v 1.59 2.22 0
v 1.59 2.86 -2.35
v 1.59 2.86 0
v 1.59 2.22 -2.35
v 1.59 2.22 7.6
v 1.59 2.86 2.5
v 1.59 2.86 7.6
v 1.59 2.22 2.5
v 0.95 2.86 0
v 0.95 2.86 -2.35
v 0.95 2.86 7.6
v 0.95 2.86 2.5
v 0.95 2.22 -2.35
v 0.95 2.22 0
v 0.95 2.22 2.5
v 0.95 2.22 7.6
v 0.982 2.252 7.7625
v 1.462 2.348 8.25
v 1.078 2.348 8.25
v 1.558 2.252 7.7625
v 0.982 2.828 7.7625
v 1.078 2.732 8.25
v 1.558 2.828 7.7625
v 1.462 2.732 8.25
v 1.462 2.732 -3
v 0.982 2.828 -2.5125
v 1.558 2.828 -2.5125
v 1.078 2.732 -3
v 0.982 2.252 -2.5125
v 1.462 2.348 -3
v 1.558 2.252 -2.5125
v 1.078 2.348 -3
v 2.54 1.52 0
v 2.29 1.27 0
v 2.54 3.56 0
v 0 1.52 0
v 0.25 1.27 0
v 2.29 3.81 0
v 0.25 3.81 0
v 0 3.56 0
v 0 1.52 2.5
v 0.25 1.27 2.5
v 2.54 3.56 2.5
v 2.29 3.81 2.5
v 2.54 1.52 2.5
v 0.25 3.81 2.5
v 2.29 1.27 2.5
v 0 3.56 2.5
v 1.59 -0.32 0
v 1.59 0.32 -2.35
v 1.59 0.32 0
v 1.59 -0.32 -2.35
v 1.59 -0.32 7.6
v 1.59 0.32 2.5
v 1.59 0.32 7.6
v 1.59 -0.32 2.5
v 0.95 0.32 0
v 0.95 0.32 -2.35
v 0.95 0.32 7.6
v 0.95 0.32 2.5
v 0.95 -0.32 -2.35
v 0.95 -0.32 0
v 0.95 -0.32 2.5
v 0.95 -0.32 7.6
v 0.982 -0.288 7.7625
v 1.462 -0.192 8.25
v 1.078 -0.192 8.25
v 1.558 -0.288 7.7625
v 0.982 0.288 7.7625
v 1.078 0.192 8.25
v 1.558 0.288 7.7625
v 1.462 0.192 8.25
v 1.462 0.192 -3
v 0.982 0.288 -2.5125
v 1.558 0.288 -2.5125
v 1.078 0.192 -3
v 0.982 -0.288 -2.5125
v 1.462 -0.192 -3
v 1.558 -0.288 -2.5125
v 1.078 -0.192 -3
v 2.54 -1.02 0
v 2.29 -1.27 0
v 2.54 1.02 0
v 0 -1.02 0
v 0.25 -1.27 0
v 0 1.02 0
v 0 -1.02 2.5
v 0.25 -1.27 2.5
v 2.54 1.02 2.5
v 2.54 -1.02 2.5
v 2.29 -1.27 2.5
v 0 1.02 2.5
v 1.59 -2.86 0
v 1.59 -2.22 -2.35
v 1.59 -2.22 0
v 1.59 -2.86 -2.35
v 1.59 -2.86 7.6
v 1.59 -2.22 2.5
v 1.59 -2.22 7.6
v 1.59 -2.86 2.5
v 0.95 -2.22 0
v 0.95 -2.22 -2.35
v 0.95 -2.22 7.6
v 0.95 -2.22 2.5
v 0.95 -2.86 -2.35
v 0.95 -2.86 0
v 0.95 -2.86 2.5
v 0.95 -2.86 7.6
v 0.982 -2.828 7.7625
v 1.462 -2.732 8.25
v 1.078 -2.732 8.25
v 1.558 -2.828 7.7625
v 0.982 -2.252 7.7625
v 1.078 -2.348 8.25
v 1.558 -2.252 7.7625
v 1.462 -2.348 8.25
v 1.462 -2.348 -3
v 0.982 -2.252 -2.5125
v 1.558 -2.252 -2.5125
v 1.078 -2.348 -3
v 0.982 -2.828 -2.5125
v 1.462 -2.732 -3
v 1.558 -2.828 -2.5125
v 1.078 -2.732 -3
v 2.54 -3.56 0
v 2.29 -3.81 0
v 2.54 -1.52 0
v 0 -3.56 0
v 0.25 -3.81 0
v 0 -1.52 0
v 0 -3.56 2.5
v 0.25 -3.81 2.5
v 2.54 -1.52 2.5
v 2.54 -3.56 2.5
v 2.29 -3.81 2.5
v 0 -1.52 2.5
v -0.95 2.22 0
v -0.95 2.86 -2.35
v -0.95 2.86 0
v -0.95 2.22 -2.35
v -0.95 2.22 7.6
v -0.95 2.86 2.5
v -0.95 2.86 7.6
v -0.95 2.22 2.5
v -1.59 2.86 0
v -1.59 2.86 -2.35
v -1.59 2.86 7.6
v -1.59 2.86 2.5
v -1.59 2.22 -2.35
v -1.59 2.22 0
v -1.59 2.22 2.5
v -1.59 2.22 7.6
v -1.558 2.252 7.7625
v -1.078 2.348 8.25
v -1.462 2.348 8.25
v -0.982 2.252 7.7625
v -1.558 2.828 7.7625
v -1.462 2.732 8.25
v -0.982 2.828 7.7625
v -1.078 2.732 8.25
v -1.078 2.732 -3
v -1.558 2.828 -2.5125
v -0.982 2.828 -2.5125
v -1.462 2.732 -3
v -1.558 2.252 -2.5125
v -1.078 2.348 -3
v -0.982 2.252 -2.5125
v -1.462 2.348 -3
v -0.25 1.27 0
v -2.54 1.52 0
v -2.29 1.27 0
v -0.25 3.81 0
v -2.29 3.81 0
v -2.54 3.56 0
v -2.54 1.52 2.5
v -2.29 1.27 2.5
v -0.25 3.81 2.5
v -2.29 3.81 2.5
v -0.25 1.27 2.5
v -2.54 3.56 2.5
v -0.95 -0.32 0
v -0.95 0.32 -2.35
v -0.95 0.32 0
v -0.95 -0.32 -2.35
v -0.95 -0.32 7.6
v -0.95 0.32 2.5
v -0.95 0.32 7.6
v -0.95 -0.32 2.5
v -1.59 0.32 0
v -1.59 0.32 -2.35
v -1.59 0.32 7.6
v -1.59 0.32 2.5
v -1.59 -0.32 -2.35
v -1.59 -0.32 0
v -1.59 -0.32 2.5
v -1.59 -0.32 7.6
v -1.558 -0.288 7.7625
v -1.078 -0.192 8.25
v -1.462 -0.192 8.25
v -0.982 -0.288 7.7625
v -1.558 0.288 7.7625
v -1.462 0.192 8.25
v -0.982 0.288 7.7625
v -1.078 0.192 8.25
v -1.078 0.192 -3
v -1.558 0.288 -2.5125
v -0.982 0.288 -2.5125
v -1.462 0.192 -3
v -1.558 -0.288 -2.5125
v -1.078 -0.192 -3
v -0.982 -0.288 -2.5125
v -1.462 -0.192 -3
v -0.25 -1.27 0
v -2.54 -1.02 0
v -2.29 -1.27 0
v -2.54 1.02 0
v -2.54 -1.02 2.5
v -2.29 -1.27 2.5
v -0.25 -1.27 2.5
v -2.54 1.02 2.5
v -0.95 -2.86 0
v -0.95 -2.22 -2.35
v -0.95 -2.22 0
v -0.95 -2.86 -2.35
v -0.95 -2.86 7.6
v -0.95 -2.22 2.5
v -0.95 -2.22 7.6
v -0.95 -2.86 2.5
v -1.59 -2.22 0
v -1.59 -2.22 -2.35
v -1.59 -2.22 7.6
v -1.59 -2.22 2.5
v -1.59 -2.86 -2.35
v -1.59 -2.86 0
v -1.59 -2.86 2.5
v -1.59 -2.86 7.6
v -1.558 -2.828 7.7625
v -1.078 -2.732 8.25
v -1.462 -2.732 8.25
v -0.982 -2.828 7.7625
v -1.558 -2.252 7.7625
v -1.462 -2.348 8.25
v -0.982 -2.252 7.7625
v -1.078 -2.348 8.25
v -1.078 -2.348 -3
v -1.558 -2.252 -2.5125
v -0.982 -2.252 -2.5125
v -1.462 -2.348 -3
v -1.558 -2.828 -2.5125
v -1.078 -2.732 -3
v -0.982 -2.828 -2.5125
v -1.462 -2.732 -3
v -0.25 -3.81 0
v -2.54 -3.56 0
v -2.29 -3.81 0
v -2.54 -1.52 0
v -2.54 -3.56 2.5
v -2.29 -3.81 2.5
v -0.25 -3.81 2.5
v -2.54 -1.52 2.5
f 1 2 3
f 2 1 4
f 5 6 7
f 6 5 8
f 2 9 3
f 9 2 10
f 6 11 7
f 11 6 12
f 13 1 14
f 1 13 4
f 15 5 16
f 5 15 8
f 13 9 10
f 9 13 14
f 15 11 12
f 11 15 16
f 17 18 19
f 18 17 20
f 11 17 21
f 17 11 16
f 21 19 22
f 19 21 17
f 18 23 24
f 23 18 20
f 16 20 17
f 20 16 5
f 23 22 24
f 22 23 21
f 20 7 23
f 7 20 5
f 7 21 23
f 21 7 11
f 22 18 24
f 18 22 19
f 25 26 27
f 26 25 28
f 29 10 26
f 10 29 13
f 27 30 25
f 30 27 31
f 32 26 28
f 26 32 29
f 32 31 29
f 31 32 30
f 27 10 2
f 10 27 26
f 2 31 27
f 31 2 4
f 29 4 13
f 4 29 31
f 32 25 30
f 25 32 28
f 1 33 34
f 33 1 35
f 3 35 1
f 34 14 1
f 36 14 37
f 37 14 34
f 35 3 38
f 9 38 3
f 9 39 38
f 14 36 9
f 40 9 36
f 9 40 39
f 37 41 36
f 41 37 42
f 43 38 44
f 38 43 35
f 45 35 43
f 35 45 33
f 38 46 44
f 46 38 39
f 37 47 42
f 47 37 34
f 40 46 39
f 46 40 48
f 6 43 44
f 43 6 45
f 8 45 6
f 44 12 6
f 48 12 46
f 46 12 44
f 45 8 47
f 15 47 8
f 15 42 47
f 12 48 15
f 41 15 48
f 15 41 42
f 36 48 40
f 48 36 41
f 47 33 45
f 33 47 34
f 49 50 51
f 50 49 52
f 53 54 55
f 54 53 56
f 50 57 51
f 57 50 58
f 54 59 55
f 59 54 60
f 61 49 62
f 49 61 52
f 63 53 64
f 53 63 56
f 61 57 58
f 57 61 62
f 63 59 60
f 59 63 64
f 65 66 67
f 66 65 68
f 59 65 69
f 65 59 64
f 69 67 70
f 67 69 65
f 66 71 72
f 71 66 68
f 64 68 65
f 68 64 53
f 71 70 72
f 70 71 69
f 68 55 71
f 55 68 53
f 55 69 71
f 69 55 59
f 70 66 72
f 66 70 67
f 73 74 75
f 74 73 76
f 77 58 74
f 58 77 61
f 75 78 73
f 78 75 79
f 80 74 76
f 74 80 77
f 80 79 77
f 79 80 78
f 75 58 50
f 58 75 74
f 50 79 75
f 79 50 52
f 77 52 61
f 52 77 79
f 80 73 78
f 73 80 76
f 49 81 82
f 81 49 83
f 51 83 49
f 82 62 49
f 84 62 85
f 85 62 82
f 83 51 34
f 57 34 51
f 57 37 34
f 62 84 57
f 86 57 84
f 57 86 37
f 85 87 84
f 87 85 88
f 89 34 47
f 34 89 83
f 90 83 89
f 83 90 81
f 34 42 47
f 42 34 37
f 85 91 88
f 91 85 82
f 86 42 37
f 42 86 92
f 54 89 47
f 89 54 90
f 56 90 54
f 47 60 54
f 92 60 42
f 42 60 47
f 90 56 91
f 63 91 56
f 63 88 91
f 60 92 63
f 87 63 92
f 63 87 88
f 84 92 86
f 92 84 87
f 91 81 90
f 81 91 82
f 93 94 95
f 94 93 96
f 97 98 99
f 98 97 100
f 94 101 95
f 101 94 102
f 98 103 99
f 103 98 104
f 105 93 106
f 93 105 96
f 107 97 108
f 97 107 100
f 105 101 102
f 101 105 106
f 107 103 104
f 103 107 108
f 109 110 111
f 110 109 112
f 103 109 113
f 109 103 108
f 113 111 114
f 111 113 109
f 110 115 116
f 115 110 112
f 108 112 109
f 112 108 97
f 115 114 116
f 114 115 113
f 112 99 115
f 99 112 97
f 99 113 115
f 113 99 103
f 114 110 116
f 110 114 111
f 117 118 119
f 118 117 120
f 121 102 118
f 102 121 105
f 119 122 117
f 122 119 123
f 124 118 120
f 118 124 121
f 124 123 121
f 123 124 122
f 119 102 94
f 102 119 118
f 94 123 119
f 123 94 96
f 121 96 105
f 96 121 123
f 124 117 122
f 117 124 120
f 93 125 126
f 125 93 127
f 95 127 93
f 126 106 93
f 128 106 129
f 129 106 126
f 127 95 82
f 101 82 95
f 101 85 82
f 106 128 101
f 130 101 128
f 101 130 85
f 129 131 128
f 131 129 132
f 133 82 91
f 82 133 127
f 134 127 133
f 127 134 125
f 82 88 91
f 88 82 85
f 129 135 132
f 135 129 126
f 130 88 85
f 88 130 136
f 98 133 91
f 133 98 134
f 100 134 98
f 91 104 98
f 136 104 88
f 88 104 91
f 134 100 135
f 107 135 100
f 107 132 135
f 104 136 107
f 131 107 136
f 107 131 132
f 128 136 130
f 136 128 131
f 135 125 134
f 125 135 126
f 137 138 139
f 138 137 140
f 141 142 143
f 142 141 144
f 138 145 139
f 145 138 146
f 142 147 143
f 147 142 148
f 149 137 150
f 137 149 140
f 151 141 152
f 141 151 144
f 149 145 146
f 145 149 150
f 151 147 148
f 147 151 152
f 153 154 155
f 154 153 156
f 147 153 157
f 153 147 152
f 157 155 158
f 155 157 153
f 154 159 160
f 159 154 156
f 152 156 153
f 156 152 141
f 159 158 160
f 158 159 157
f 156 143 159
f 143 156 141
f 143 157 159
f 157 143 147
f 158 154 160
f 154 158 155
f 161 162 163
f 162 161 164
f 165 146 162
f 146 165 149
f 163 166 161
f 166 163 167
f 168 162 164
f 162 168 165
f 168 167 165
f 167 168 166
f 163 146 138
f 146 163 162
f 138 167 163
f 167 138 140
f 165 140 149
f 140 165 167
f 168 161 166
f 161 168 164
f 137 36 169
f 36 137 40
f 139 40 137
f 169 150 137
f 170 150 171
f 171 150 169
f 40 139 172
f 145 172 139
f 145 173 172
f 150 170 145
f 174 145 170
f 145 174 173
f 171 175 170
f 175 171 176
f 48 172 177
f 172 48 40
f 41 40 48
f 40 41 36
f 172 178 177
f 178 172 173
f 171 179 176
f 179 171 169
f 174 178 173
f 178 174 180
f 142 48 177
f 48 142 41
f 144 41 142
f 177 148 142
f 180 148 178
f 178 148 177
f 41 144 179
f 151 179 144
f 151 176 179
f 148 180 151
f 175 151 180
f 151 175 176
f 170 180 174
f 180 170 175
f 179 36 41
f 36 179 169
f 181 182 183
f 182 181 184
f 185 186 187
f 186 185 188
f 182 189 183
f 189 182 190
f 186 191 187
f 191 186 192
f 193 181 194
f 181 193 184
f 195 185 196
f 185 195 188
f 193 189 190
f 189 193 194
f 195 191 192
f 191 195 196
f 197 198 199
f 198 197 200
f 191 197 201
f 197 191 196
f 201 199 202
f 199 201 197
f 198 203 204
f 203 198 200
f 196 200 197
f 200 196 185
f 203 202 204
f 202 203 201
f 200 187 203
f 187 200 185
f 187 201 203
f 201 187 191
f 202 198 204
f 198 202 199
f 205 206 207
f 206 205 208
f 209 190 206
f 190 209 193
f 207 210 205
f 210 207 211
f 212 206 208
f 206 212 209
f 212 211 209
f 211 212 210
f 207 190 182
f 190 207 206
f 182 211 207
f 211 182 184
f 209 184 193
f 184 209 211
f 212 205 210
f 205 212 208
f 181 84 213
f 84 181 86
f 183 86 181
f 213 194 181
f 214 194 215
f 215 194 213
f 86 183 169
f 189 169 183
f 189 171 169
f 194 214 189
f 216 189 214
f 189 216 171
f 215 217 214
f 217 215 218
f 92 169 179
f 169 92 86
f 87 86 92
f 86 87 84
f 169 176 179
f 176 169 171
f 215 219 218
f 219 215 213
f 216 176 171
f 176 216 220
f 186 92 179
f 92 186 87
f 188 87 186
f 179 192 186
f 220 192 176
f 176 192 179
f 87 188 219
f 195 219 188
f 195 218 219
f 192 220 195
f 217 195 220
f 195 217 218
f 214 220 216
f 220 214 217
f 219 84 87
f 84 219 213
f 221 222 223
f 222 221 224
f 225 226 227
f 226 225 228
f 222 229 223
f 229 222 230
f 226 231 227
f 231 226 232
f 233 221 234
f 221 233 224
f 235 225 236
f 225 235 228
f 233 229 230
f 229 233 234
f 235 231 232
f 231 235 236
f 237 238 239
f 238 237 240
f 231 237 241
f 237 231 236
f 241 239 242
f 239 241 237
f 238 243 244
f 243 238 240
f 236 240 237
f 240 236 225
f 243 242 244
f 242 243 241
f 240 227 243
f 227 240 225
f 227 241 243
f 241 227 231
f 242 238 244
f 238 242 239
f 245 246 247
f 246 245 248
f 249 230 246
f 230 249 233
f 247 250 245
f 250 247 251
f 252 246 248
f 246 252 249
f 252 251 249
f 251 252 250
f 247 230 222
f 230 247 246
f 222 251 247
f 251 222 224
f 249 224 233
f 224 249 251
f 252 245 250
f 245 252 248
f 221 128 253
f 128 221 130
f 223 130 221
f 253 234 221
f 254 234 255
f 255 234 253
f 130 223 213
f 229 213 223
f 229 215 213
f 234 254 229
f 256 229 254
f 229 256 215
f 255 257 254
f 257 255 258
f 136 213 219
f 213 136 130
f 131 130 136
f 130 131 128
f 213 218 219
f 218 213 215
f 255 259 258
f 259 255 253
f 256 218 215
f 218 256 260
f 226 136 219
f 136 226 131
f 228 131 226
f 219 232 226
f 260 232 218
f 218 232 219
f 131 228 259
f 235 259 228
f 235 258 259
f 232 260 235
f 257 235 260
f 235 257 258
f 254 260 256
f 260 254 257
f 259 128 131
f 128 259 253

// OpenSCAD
// Start: lazy_union
default_5_default_5();
// End: lazy_union

// Modules.

// 'PartMaterial undef-default - default 5.0'
module default_5_default_5() {
  // 'None : _combine_solids_and_holes'
  union() {
    // 'default : _combine_solids_and_holes'
    union() {
      // ('pin', 2, 1)
      multmatrix(m=[[1.0, 0.0, 0.0, 1.27], [0.0, -1.0, 0.0, 2.54], [0.0, 0.0, -1.0, 0.0], [0.0, 0.0, 0.0, 1.0]]) {
        // "('pin', 2, 1) : _combine_solids_and_holes"
        union() {
          // 'base'
          multmatrix(m=[[1.0, 0.0, 0.0, -1.27], [-0.0, -1.0, -0.0, 1.27], [-0.0, -0.0, -1.0, -0.0], [0.0, 0.0, 0.0, 1.0]]) {
            // 'base : _combine_solids_and_holes'
            union() {
              // 'base : _combine_solids_and_holes'
              union() {
                // 'base'
                linear_extrude(height=2.5, twist=0.0, slices=4, scale=[1.0, 1.0]) {
                  polygon(points=[[0.0, 0.25], [0.25, 0.0], [2.29, 0.0], [2.54, 0.25], [2.54, 2.29], [2.29, 2.54], [0.25, 2.54], [0.0, 2.29]]);
                }
              }
            }
          }
          // 'pin'
          multmatrix(m=[[1.0, -1.0146536357569526e-17, 0.0, 0.0], [-1.0146536357569526e-17, 1.0, 0.0, 0.0], [0.0, 0.0, 1.0, -2.625], [0.0, 0.0, 0.0, 1.0]]) {
            // 'pin : _combine_solids_and_holes'
            union() {
              // 'mid'
              multmatrix(m=[[0.7071067811865475, 0.7071067811865475, 0.0, 0.0], [0.7071067811865475, -0.7071067811865475, 0.0, 0.0], [0.0, 0.0, -1.0, 4.975], [0.0, 0.0, 0.0, 1.0]]) {
                // 'mid : _combine_solids_and_holes'
                union() {
                  // 'prism'
                  multmatrix(m=[[-1.0, -0.0, -0.0, -0.0], [-0.0, -1.0, -0.0, -0.0], [0.0, 0.0, 1.0, 0.0], [0.0, 0.0, 0.0, 1.0]]) {
                    // 'prism : _combine_solids_and_holes'
                    union() {
                      // 'prism'
                      linear_extrude(height=9.95, twist=0.0, slices=4, scale=[1.0, 1.0]) {
                        polygon(points=[[-0.45254833995939037, 0.0], [-2.7710593799535783e-17, 0.45254833995939037], [0.45254833995939037, 5.5421187599071566e-17], [8.313178139860734e-17, -0.45254833995939037]]);
                      }
                    }
                  }
                }
              }
              // 'upper'
              multmatrix(m=[[0.7071067811865475, 0.7071067811865475, 0.0, 0.0], [0.7071067811865475, -0.7071067811865475, 0.0, 0.0], [0.0, 0.0, -1.0, -4.975], [0.0, 0.0, 0.0, 1.0]]) {
                // 'upper : _combine_solids_and_holes'
                union() {
                  // 'prism'
                  multmatrix(m=[[-1.0, -0.0, -0.0, -0.0], [-0.0, -1.0, -0.0, -0.0], [0.0, 0.0, 1.0, 0.0], [0.0, 0.0, 0.0, 1.0]]) {
                    // 'prism : _combine_solids_and_holes'
                    union() {
                      // 'prism'
                      linear_extrude(height=0.65, twist=0.0, slices=4, scale=[0.6, 0.6]) {
                        polygon(points=[[-0.45254833995939037, 0.0], [-0.3394112549695428, 0.11313708498984759], [-0.2262741699796952, 0.22627416997969518], [-0.11313708498984762, 0.3394112549695428], [-2.7710593799535783e-17, 0.45254833995939037], [0.11313708498984759, 0.3394112549695428], [0.22627416997969518, 0.2262741699796952], [0.3394112549695428, 0.11313708498984763], [0.45254833995939037, 5.5421187599071566e-17], [0.3394112549695428, -0.11313708498984754], [0.22627416997969524, -0.22627416997969516], [0.11313708498984766, -0.3394112549695428], [8.313178139860734e-17, -0.45254833995939037], [-0.11313708498984754, -0.33941125496954283], [-0.22627416997969516, -0.22627416997969524], [-0.3394112549695428, -0.11313708498984767]]);
                      }
                    }
                  }
                }
              }
              // 'lower'
              multmatrix(m=[[0.7071067811865475, 0.7071067811865475, 0.0, 0.0], [-0.7071067811865475, 0.7071067811865475, 0.0, 0.0], [0.0, 0.0, 1.0, 4.975], [0.0, 0.0, 0.0, 1.0]]) {
                // 'lower : _combine_solids_and_holes'
                union() {
                  // 'prism'
                  multmatrix(m=[[-1.0, -0.0, -0.0, -0.0], [-0.0, -1.0, -0.0, -0.0], [0.0, 0.0, 1.0, 0.0], [0.0, 0.0, 0.0, 1.0]]) {
                    // 'prism : _combine_solids_and_holes'
                    union() {
                      // 'prism'
                      linear_extrude(height=0.65, twist=0.0, slices=4, scale=[0.6, 0.6]) {
                        polygon(points=[[-0.45254833995939037, 0.0], [-0.3394112549695428, 0.11313708498984759], [-0.2262741699796952, 0.22627416997969518], [-0.11313708498984762, 0.3394112549695428], [-2.7710593799535783e-17, 0.45254833995939037], [0.11313708498984759, 0.3394112549695428], [0.22627416997969518, 0.2262741699796952], [0.3394112549695428, 0.11313708498984763], [0.45254833995939037, 5.5421187599071566e-17], [0.3394112549695428, -0.11313708498984754], [0.22627416997969524, -0.22627416997969516], [0.11313708498984766, -0.3394112549695428], [8.313178139860734e-17, -0.45254833995939037], [-0.11313708498984754, -0.33941125496954283], [-0.22627416997969516, -0.22627416997969524], [-0.3394112549695428, -0.11313708498984767]]);
                      }
                    }
                  }
                }
              }
            }
          }
        }
      }
      // ('pin', 2, 2)
      multmatrix(m=[[1.0, 0.0, 0.0, 1.27], [0.0, -1.0, 0.0, 0.0], [0.0, 0.0, -1.0, 0.0], [0.0, 0.0, 0.0, 1.0]]) {
        // "('pin', 2, 2) : _combine_solids_and_holes"
        union() {
          // 'base'
          multmatrix(m=[[1.0, 0.0, 0.0, -1.27], [-0.0, -1.0, -0.0, 1.27], [-0.0, -0.0, -1.0, -0.0], [0.0, 0.0, 0.0, 1.0]]) {
            // 'base : _combine_solids_and_holes'
            union() {
              // 'base : _combine_solids_and_holes'
              union() {
                // 'base'
                linear_extrude(height=2.5, twist=0.0, slices=4, scale=[1.0, 1.0]) {
                  polygon(points=[[0.0, 0.25], [0.25, 0.0], [2.29, 0.0], [2.54, 0.25], [2.54, 2.29], [2.29, 2.54], [0.25, 2.54], [0.0, 2.29]]);
                }
              }
            }
          }
          // 'pin'
          multmatrix(m=[[1.0, -1.0146536357569526e-17, 0.0, 0.0], [-1.0146536357569526e-17, 1.0, 0.0, 0.0], [0.0, 0.0, 1.0, -2.625], [0.0, 0.0, 0.0, 1.0]]) {
            // 'pin : _combine_solids_and_holes'
            union() {
              // 'mid'
              multmatrix(m=[[0.7071067811865475, 0.7071067811865475, 0.0, 0.0], [0.7071067811865475, -0.7071067811865475, 0.0, 0.0], [0.0, 0.0, -1.0, 4.975], [0.0, 0.0, 0.0, 1.0]]) {
                // 'mid : _combine_solids_and_holes'
                union() {
                  // 'prism'
                  multmatrix(m=[[-1.0, -0.0, -0.0, -0.0], [-0.0, -1.0, -0.0, -0.0], [0.0, 0.0, 1.0, 0.0], [0.0, 0.0, 0.0, 1.0]]) {
                    // 'prism : _combine_solids_and_holes'
                    union() {
                      // 'prism'
                      linear_extrude(height=9.95, twist=0.0, slices=4, scale=[1.0, 1.0]) {
                        polygon(points=[[-0.45254833995939037, 0.0], [-2.7710593799535783e-17, 0.45254833995939037], [0.45254833995939037, 5.5421187599071566e-17], [8.313178139860734e-17, -0.45254833995939037]]);
                      }
                    }
                  }
                }
              }
              // 'upper'
              multmatrix(m=[[0.7071067811865475, 0.7071067811865475, 0.0, 0.0], [0.7071067811865475, -0.7071067811865475, 0.0, 0.0], [0.0, 0.0, -1.0, -4.975], [0.0, 0.0, 0.0, 1.0]]) {
                // 'upper : _combine_solids_and_holes'
                union() {
                  // 'prism'
                  multmatrix(m=[[-1.0, -0.0, -0.0, -0.0], [-0.0, -1.0, -0.0, -0.0], [0.0, 0.0, 1.0, 0.0], [0.0, 0.0, 0.0, 1.0]]) {
                    // 'prism : _combine_solids_and_holes'
                    union() {
                      // 'prism'
                      linear_extrude(height=0.65, twist=0.0, slices=4, scale=[0.6, 0.6]) {
                        polygon(points=[[-0.45254833995939037, 0.0], [-0.3394112549695428, 0.11313708498984759], [-0.2262741699796952, 0.22627416997969518], [-0.11313708498984762, 0.3394112549695428], [-2.7710593799535783e-17, 0.45254833995939037], [0.11313708498984759, 0.3394112549695428], [0.22627416997969518, 0.2262741699796952], [0.3394112549695428, 0.11313708498984763], [0.45254833995939037, 5.5421187599071566e-17], [0.3394112549695428, -0.11313708498984754], [0.22627416997969524, -0.22627416997969516], [0.11313708498984766, -0.3394112549695428], [8.313178139860734e-17, -0.45254833995939037], [-0.11313708498984754, -0.33941125496954283], [-0.22627416997969516, -0.22627416997969524], [-0.3394112549695428, -0.11313708498984767]]);
                      }
                    }
                  }
                }
              }
              // 'lower'
              multmatrix(m=[[0.7071067811865475, 0.7071067811865475, 0.0, 0.0], [-0.7071067811865475, 0.7071067811865475, 0.0, 0.0], [0.0, 0.0, 1.0, 4.975], [0.0, 0.0, 0.0, 1.0]]) {
                // 'lower : _combine_solids_and_holes'
                union() {
                  // 'prism'
                  multmatrix(m=[[-1.0, -0.0, -0.0, -0.0], [-0.0, -1.0, -0.0, -0.0], [0.0, 0.0, 1.0, 0.0], [0.0, 0.0, 0.0, 1.0]]) {
                    // 'prism : _combine_solids_and_holes'
                    union() {
                      // 'prism'
                      linear_extrude(height=0.65, twist=0.0, slices=4, scale=[0.6, 0.6]) {
                        polygon(points=[[-0.45254833995939037, 0.0], [-0.3394112549695428, 0.11313708498984759], [-0.2262741699796952, 0.22627416997969518], [-0.11313708498984762, 0.3394112549695428], [-2.7710593799535783e-17, 0.45254833995939037], [0.11313708498984759, 0.3394112549695428], [0.22627416997969518, 0.2262741699796952], [0.3394112549695428, 0.11313708498984763], [0.45254833995939037, 5.5421187599071566e-17], [0.3394112549695428, -0.11313708498984754], [0.22627416997969524, -0.22627416997969516], [0.11313708498984766, -0.3394112549695428], [8.313178139860734e-17, -0.45254833995939037], [-0.11313708498984754, -0.33941125496954283], [-0.22627416997969516, -0.22627416997969524], [-0.3394112549695428, -0.11313708498984767]]);
                      }
                    }
                  }
                }
              }
            }
          }
        }
      }
      // ('pin', 2, 3)
      multmatrix(m=[[1.0, 0.0, 0.0, 1.27], [0.0, -1.0, 0.0, -2.5399999999999996], [0.0, 0.0, -1.0, 0.0], [0.0, 0.0, 0.0, 1.0]]) {
        // "('pin', 2, 3) : _combine_solids_and_holes"
        union() {
          // 'base'
          multmatrix(m=[[1.0, 0.0, 0.0, -1.27], [-0.0, -1.0, -0.0, 1.27], [-0.0, -0.0, -1.0, -0.0], [0.0, 0.0, 0.0, 1.0]]) {
            // 'base : _combine_solids_and_holes'
            union() {
              // 'base : _combine_solids_and_holes'
              union() {
                // 'base'
                linear_extrude(height=2.5, twist=0.0, slices=4, scale=[1.0, 1.0]) {
                  polygon(points=[[0.0, 0.25], [0.25, 0.0], [2.29, 0.0], [2.54, 0.25], [2.54, 2.29], [2.29, 2.54], [0.25, 2.54], [0.0, 2.29]]);
                }
              }
            }
          }
          // 'pin'
          multmatrix(m=[[1.0, -1.0146536357569526e-17, 0.0, 0.0], [-1.0146536357569526e-17, 1.0, 0.0, 0.0], [0.0, 0.0, 1.0, -2.625], [0.0, 0.0, 0.0, 1.0]]) {
            // 'pin : _combine_solids_and_holes'
            union() {
              // 'mid'
              multmatrix(m=[[0.7071067811865475, 0.7071067811865475, 0.0, 0.0], [0.7071067811865475, -0.7071067811865475, 0.0, 0.0], [0.0, 0.0, -1.0, 4.975], [0.0, 0.0, 0.0, 1.0]]) {
                // 'mid : _combine_solids_and_holes'
                union() {
                  // 'prism'
                  multmatrix(m=[[-1.0, -0.0, -0.0, -0.0], [-0.0, -1.0, -0.0, -0.0], [0.0, 0.0, 1.0, 0.0], [0.0, 0.0, 0.0, 1.0]]) {
                    // 'prism : _combine_solids_and_holes'
                    union() {
                      // 'prism'
                      linear_extrude(height=9.95, twist=0.0, slices=4, scale=[1.0, 1.0]) {
                        polygon(points=[[-0.45254833995939037, 0.0], [-2.7710593799535783e-17, 0.45254833995939037], [0.45254833995939037, 5.5421187599071566e-17], [8.313178139860734e-17, -0.45254833995939037]]);
                      }
                    }
                  }
                }
              }
              // 'upper'
              multmatrix(m=[[0.7071067811865475, 0.7071067811865475, 0.0, 0.0], [0.7071067811865475, -0.7071067811865475, 0.0, 0.0], [0.0, 0.0, -1.0, -4.975], [0.0, 0.0, 0.0, 1.0]]) {
                // 'upper : _combine_solids_and_holes'
                union() {
                  // 'prism'
                  multmatrix(m=[[-1.0, -0.0, -0.0, -0.0], [-0.0, -1.0, -0.0, -0.0], [0.0, 0.0, 1.0, 0.0], [0.0, 0.0, 0.0, 1.0]]) {
                    // 'prism : _combine_solids_and_holes'
                    union() {
                      // 'prism'
                      linear_extrude(height=0.65, twist=0.0, slices=4, scale=[0.6, 0.6]) {
                        polygon(points=[[-0.45254833995939037, 0.0], [-0.3394112549695428, 0.11313708498984759], [-0.2262741699796952, 0.22627416997969518], [-0.11313708498984762, 0.3394112549695428], [-2.7710593799535783e-17, 0.45254833995939037], [0.11313708498984759, 0.3394112549695428], [0.22627416997969518, 0.2262741699796952], [0.3394112549695428, 0.11313708498984763], [0.45254833995939037, 5.5421187599071566e-17], [0.3394112549695428, -0.11313708498984754], [0.22627416997969524, -0.22627416997969516], [0.11313708498984766, -0.3394112549695428], [8.313178139860734e-17, -0.45254833995939037], [-0.11313708498984754, -0.33941125496954283], [-0.22627416997969516, -0.22627416997969524], [-0.3394112549695428, -0.11313708498984767]]);
                      }
                    }
                  }
                }
              }
              // 'lower'
              multmatrix(m=[[0.7071067811865475, 0.7071067811865475, 0.0, 0.0], [-0.7071067811865475, 0.7071067811865475, 0.0, 0.0], [0.0, 0.0, 1.0, 4.975], [0.0, 0.0, 0.0, 1.0]]) {
                // 'lower : _combine_solids_and_holes'
                union() {
                  // 'prism'
                  multmatrix(m=[[-1.0, -0.0, -0.0, -0.0], [-0.0, -1.0, -0.0, -0.0], [0.0, 0.0, 1.0, 0.0], [0.0, 0.0, 0.0, 1.0]]) {
                    // 'prism : _combine_solids_and_holes'
                    union() {
                      // 'prism'
                      linear_extrude(height=0.65, twist=0.0, slices=4, scale=[0.6, 0.6]) {
                        polygon(points=[[-0.45254833995939037, 0.0], [-0.3394112549695428, 0.11313708498984759], [-0.2262741699796952, 0.22627416997969518], [-0.11313708498984762, 0.3394112549695428], [-2.7710593799535783e-17, 0.45254833995939037], [0.11313708498984759, 0.3394112549695428], [0.22627416997969518, 0.2262741699796952], [0.3394112549695428, 0.11313708498984763], [0.45254833995939037, 5.5421187599071566e-17], [0.3394112549695428, -0.11313708498984754], [0.22627416997969524, -0.22627416997969516], [0.11313708498984766, -0.3394112549695428], [8.313178139860734e-17, -0.45254833995939037], [-0.11313708498984754, -0.33941125496954283], [-0.22627416997969516, -0.22627416997969524], [-0.3394112549695428, -0.11313708498984767]]);
                      }
                    }
                  }
                }
              }
            }
          }
        }
      }
      // ('pin', 1, 1)
      multmatrix(m=[[1.0, 0.0, 0.0, -1.27], [0.0, -1.0, 0.0, 2.54], [0.0, 0.0, -1.0, 0.0], [0.0, 0.0, 0.0, 1.0]]) {
        // "('pin', 1, 1) : _combine_solids_and_holes"
        union() {
          // 'base'
          multmatrix(m=[[1.0, 0.0, 0.0, -1.27], [-0.0, -1.0, -0.0, 1.27], [-0.0, -0.0, -1.0, -0.0], [0.0, 0.0, 0.0, 1.0]]) {
            // 'base : _combine_solids_and_holes'
            union() {
              // 'base : _combine_solids_and_holes'
              union() {
                // 'base'
                linear_extrude(height=2.5, twist=0.0, slices=4, scale=[1.0, 1.0]) {
                  polygon(points=[[0.0, 0.25], [0.25, 0.0], [2.29, 0.0], [2.54, 0.25], [2.54, 2.29], [2.29, 2.54], [0.25, 2.54], [0.0, 2.29]]);
                }
              }
            }
          }
          // 'pin'
          multmatrix(m=[[1.0, -1.0146536357569526e-17, 0.0, 0.0], [-1.0146536357569526e-17, 1.0, 0.0, 0.0], [0.0, 0.0, 1.0, -2.625], [0.0, 0.0, 0.0, 1.0]]) {
            // 'pin : _combine_solids_and_holes'
            union() {
              // 'mid'
              multmatrix(m=[[0.7071067811865475, 0.7071067811865475, 0.0, 0.0], [0.7071067811865475, -0.7071067811865475, 0.0, 0.0], [0.0, 0.0, -1.0, 4.975], [0.0, 0.0, 0.0, 1.0]]) {
                // 'mid : _combine_solids_and_holes'
                union() {
                  // 'prism'
                  multmatrix(m=[[-1.0, -0.0, -0.0, -0.0], [-0.0, -1.0, -0.0, -0.0], [0.0, 0.0, 1.0, 0.0], [0.0, 0.0, 0.0, 1.0]]) {
                    // 'prism : _combine_solids_and_holes'
                    union() {
                      // 'prism'
                      linear_extrude(height=9.95, twist=0.0, slices=4, scale=[1.0, 1.0]) {
                        polygon(points=[[-0.45254833995939037, 0.0], [-2.7710593799535783e-17, 0.45254833995939037], [0.45254833995939037, 5.5421187599071566e-17], [8.313178139860734e-17, -0.45254833995939037]]);
                      }
                    }
                  }
                }
              }
              // 'upper'
              multmatrix(m=[[0.7071067811865475, 0.7071067811865475, 0.0, 0.0], [0.7071067811865475, -0.7071067811865475, 0.0, 0.0], [0.0, 0.0, -1.0, -4.975], [0.0, 0.0, 0.0, 1.0]]) {
                // 'upper : _combine_solids_and_holes'
                union() {
                  // 'prism'
                  multmatrix(m=[[-1.0, -0.0, -0.0, -0.0], [-0.0, -1.0, -0.0, -0.0], [0.0, 0.0, 1.0, 0.0], [0.0, 0.0, 0.0, 1.0]]) {
                    // 'prism : _combine_solids_and_holes'
                    union() {
                      // 'prism'
                      linear_extrude(height=0.65, twist=0.0, slices=4, scale=[0.6, 0.6]) {
                        polygon(points=[[-0.45254833995939037, 0.0], [-0.3394112549695428, 0.11313708498984759], [-0.2262741699796952, 0.22627416997969518], [-0.11313708498984762, 0.3394112549695428], [-2.7710593799535783e-17, 0.45254833995939037], [0.11313708498984759, 0.3394112549695428], [0.22627416997969518, 0.2262741699796952], [0.3394112549695428, 0.11313708498984763], [0.45254833995939037, 5.5421187599071566e-17], [0.3394112549695428, -0.11313708498984754], [0.22627416997969524, -0.22627416997969516], [0.11313708498984766, -0.3394112549695428], [8.313178139860734e-17, -0.45254833995939037], [-0.11313708498984754, -0.33941125496954283], [-0.22627416997969516, -0.22627416997969524], [-0.3394112549695428, -0.11313708498984767]]);
                      }
                    }
                  }
                }
              }
              // 'lower'
              multmatrix(m=[[0.7071067811865475, 0.7071067811865475, 0.0, 0.0], [-0.7071067811865475, 0.7071067811865475, 0.0, 0.0], [0.0, 0.0, 1.0, 4.975], [0.0, 0.0, 0.0, 1.0]]) {
                // 'lower : _combine_solids_and_holes'
                union() {
                  // 'prism'
                  multmatrix(m=[[-1.0, -0.0, -0.0, -0.0], [-0.0, -1.0, -0.0, -0.0], [0.0, 0.0, 1.0, 0.0], [0.0, 0.0, 0.0, 1.0]]) {
                    // 'prism : _combine_solids_and_holes'
                    union() {
                      // 'prism'
                      linear_extrude(height=0.65, twist=0.0, slices=4, scale=[0.6, 0.6]) {
                        polygon(points=[[-0.45254833995939037, 0.0], [-0.3394112549695428, 0.11313708498984759], [-0.2262741699796952, 0.22627416997969518], [-0.11313708498984762, 0.3394112549695428], [-2.7710593799535783e-17, 0.45254833995939037], [0.11313708498984759, 0.3394112549695428], [0.22627416997969518, 0.2262741699796952], [0.3394112549695428, 0.11313708498984763], [0.45254833995939037, 5.5421187599071566e-17], [0.3394112549695428, -0.11313708498984754], [0.22627416997969524, -0.22627416997969516], [0.11313708498984766, -0.3394112549695428], [8.313178139860734e-17, -0.45254833995939037], [-0.11313708498984754, -0.33941125496954283], [-0.22627416997969516, -0.22627416997969524], [-0.3394112549695428, -0.11313708498984767]]);
                      }
                    }
                  }
                }
              }
            }
          }
        }
      }
      // ('pin', 1, 2)
      multmatrix(m=[[1.0, 0.0, 0.0, -1.27], [0.0, -1.0, 0.0, 0.0], [0.0, 0.0, -1.0, 0.0], [0.0, 0.0, 0.0, 1.0]]) {
        // "('pin', 1, 2) : _combine_solids_and_holes"
        union() {
          // 'base'
          multmatrix(m=[[1.0, 0.0, 0.0, -1.27], [-0.0, -1.0, -0.0, 1.27], [-0.0, -0.0, -1.0, -0.0], [0.0, 0.0, 0.0, 1.0]]) {
            // 'base : _combine_solids_and_holes'
            union() {
              // 'base : _combine_solids_and_holes'
              union() {
                // 'base'
                linear_extrude(height=2.5, twist=0.0, slices=4, scale=[1.0, 1.0]) {
                  polygon(points=[[0.0, 0.25], [0.25, 0.0], [2.29, 0.0], [2.54, 0.25], [2.54, 2.29], [2.29, 2.54], [0.25, 2.54], [0.0, 2.29]]);
                }
              }
            }
          }
          // 'pin'
          multmatrix(m=[[1.0, -1.0146536357569526e-17, 0.0, 0.0], [-1.0146536357569526e-17, 1.0, 0.0, 0.0], [0.0, 0.0, 1.0, -2.625], [0.0, 0.0, 0.0, 1.0]]) {
            // 'pin : _combine_solids_and_holes'
            union() {
              // 'mid'
              multmatrix(m=[[0.7071067811865475, 0.7071067811865475, 0.0, 0.0], [0.7071067811865475, -0.7071067811865475, 0.0, 0.0], [0.0, 0.0, -1.0, 4.975], [0.0, 0.0, 0.0, 1.0]]) {
                // 'mid : _combine_solids_and_holes'
                union() {
                  // 'prism'
                  multmatrix(m=[[-1.0, -0.0, -0.0, -0.0], [-0.0, -1.0, -0.0, -0.0], [0.0, 0.0, 1.0, 0.0], [0.0, 0.0, 0.0, 1.0]]) {
                    // 'prism : _combine_solids_and_holes'
                    union() {
                      // 'prism'
                      linear_extrude(height=9.95, twist=0.0, slices=4, scale=[1.0, 1.0]) {
                        polygon(points=[[-0.45254833995939037, 0.0], [-2.7710593799535783e-17, 0.45254833995939037], [0.45254833995939037, 5.5421187599071566e-17], [8.313178139860734e-17, -0.45254833995939037]]);
                      }
                    }
                  }
                }
              }
              // 'upper'
              multmatrix(m=[[0.7071067811865475, 0.7071067811865475, 0.0, 0.0], [0.7071067811865475, -0.7071067811865475, 0.0, 0.0], [0.0, 0.0, -1.0, -4.975], [0.0, 0.0, 0.0, 1.0]]) {
                // 'upper : _combine_solids_and_holes'
                union() {
                  // 'prism'
                  multmatrix(m=[[-1.0, -0.0, -0.0, -0.0], [-0.0, -1.0, -0.0, -0.0], [0.0, 0.0, 1.0, 0.0], [0.0, 0.0, 0.0, 1.0]]) {
                    // 'prism : _combine_solids_and_holes'
                    union() {
                      // 'prism'
                      linear_extrude(height=0.65, twist=0.0, slices=4, scale=[0.6, 0.6]) {
                        polygon(points=[[-0.45254833995939037, 0.0], [-0.3394112549695428, 0.11313708498984759], [-0.2262741699796952, 0.22627416997969518], [-0.11313708498984762, 0.3394112549695428], [-2.7710593799535783e-17, 0.45254833995939037], [0.11313708498984759, 0.3394112549695428], [0.22627416997969518, 0.2262741699796952], [0.3394112549695428, 0.11313708498984763], [0.45254833995939037, 5.5421187599071566e-17], [0.3394112549695428, -0.11313708498984754], [0.22627416997969524, -0.22627416997969516], [0.11313708498984766, -0.3394112549695428], [8.313178139860734e-17, -0.45254833995939037], [-0.11313708498984754, -0.33941125496954283], [-0.22627416997969516, -0.22627416997969524], [-0.3394112549695428, -0.11313708498984767]]);
                      }
                    }
                  }
                }
              }
              // 'lower'
              multmatrix(m=[[0.7071067811865475, 0.7071067811865475, 0.0, 0.0], [-0.7071067811865475, 0.7071067811865475, 0.0, 0.0], [0.0, 0.0, 1.0, 4.975], [0.0, 0.0, 0.0, 1.0]]) {
                // 'lower : _combine_solids_and_holes'
                union() {
                  // 'prism'
                  multmatrix(m=[[-1.0, -0.0, -0.0, -0.0], [-0.0, -1.0, -0.0, -0.0], [0.0, 0.0, 1.0, 0.0], [0.0, 0.0, 0.0, 1.0]]) {
                    // 'prism : _combine_solids_and_holes'
                    union() {
                      // 'prism'
                      linear_extrude(height=0.65, twist=0.0, slices=4, scale=[0.6, 0.6]) {
                        polygon(points=[[-0.45254833995939037, 0.0], [-0.3394112549695428, 0.11313708498984759], [-0.2262741699796952, 0.22627416997969518], [-0.11313708498984762, 0.3394112549695428], [-2.7710593799535783e-17, 0.45254833995939037], [0.11313708498984759, 0.3394112549695428], [0.22627416997969518, 0.2262741699796952], [0.3394112549695428, 0.11313708498984763], [0.45254833995939037, 5.5421187599071566e-17], [0.3394112549695428, -0.11313708498984754], [0.22627416997969524, -0.22627416997969516], [0.11313708498984766, -0.3394112549695428], [8.313178139860734e-17, -0.45254833995939037], [-0.11313708498984754, -0.33941125496954283], [-0.22627416997969516, -0.22627416997969524], [-0.3394112549695428, -0.11313708498984767]]);
                      }
                    }
                  }
                }
              }
            }
          }
        }
      }
      // ('pin', 1, 3)
      multmatrix(m=[[1.0, 0.0, 0.0, -1.27], [0.0, -1.0, 0.0, -2.5399999999999996], [0.0, 0.0, -1.0, 0.0], [0.0, 0.0, 0.0, 1.0]]) {
        // "('pin', 1, 3) : _combine_solids_and_holes"
        union() {
          // 'base'
          multmatrix(m=[[1.0, 0.0, 0.0, -1.27], [-0.0, -1.0, -0.0, 1.27], [-0.0, -0.0, -1.0, -0.0], [0.0, 0.0, 0.0, 1.0]]) {
            // 'base : _combine_solids_and_holes'
            union() {
              // 'base : _combine_solids_and_holes'
              union() {
                // 'base'
                linear_extrude(height=2.5, twist=0.0, slices=4, scale=[1.0, 1.0]) {
                  polygon(points=[[0.0, 0.25], [0.25, 0.0], [2.29, 0.0], [2.54, 0.25], [2.54, 2.29], [2.29, 2.54], [0.25, 2.54], [0.0, 2.29]]);
                }
              }
            }
          }
          // 'pin'
          multmatrix(m=[[1.0, -1.0146536357569526e-17, 0.0, 0.0], [-1.0146536357569526e-17, 1.0, 0.0, 0.0], [0.0, 0.0, 1.0, -2.625], [0.0, 0.0, 0.0, 1.0]]) {
            // 'pin : _combine_solids_and_holes'
            union() {
              // 'mid'
              multmatrix(m=[[0.7071067811865475, 0.7071067811865475, 0.0, 0.0], [0.7071067811865475, -0.7071067811865475, 0.0, 0.0], [0.0, 0.0, -1.0, 4.975], [0.0, 0.0, 0.0, 1.0]]) {
                // 'mid : _combine_solids_and_holes'
                union() {
                  // 'prism'
                  multmatrix(m=[[-1.0, -0.0, -0.0, -0.0], [-0.0, -1.0, -0.0, -0.0], [0.0, 0.0, 1.0, 0.0], [0.0, 0.0, 0.0, 1.0]]) {
                    // 'prism : _combine_solids_and_holes'
                    union() {
                      // 'prism'
                      linear_extrude(height=9.95, twist=0.0, slices=4, scale=[1.0, 1.0]) {
                        polygon(points=[[-0.45254833995939037, 0.0], [-2.7710593799535783e-17, 0.45254833995939037], [0.45254833995939037, 5.5421187599071566e-17], [8.313178139860734e-17, -0.45254833995939037]]);
                      }
                    }
                  }
                }
              }
              // 'upper'
              multmatrix(m=[[0.7071067811865475, 0.7071067811865475, 0.0, 0.0], [0.7071067811865475, -0.7071067811865475, 0.0, 0.0], [0.0, 0.0, -1.0, -4.975], [0.0, 0.0, 0.0, 1.0]]) {
                // 'upper : _combine_solids_and_holes'
                union() {
                  // 'prism'
                  multmatrix(m=[[-1.0, -0.0, -0.0, -0.0], [-0.0, -1.0, -0.0, -0.0], [0.0, 0.0, 1.0, 0.0], [0.0, 0.0, 0.0, 1.0]]) {
                    // 'prism : _combine_solids_and_holes'
                    union() {
                      // 'prism'
                      linear_extrude(height=0.65, twist=0.0, slices=4, scale=[0.6, 0.6]) {
                        polygon(points=[[-0.45254833995939037, 0.0], [-0.3394112549695428, 0.11313708498984759], [-0.2262741699796952, 0.22627416997969518], [-0.11313708498984762, 0.3394112549695428], [-2.7710593799535783e-17, 0.45254833995939037], [0.11313708498984759, 0.3394112549695428], [0.22627416997969518, 0.2262741699796952], [0.3394112549695428, 0.11313708498984763], [0.45254833995939037, 5.5421187599071566e-17], [0.3394112549695428, -0.11313708498984754], [0.22627416997969524, -0.22627416997969516], [0.11313708498984766, -0.3394112549695428], [8.313178139860734e-17, -0.45254833995939037], [-0.11313708498984754, -0.33941125496954283], [-0.22627416997969516, -0.22627416997969524], [-0.3394112549695428, -0.11313708498984767]]);
                      }
                    }
                  }
                }
              }
              // 'lower'
              multmatrix(m=[[0.7071067811865475, 0.7071067811865475, 0.0, 0.0], [-0.7071067811865475, 0.7071067811865475, 0.0, 0.0], [0.0, 0.0, 1.0, 4.975], [0.0, 0.0, 0.0, 1.0]]) {
                // 'lower : _combine_solids_and_holes'
                union() {
                  // 'prism'
                  multmatrix(m=[[-1.0, -0.0, -0.0, -0.0], [-0.0, -1.0, -0.0, -0.0], [0.0, 0.0, 1.0, 0.0], [0.0, 0.0, 0.0, 1.0]]) {
                    // 'prism : _combine_solids_and_holes'
                    union() {
                      // 'prism'
                      linear_extrude(height=0.65, twist=0.0, slices=4, scale=[0.6, 0.6]) {
                        polygon(points=[[-0.45254833995939037, 0.0], [-0.3394112549695428, 0.11313708498984759], [-0.2262741699796952, 0.22627416997969518], [-0.11313708498984762, 0.3394112549695428], [-2.7710593799535783e-17, 0.45254833995939037], [0.11313708498984759, 0.3394112549695428], [0.22627416997969518, 0.2262741699796952], [0.3394112549695428, 0.11313708498984763], [0.45254833995939037, 5.5421187599071566e-17], [0.3394112549695428, -0.11313708498984754], [0.22627416997969524, -0.22627416997969516], [0.11313708498984766, -0.3394112549695428], [8.313178139860734e-17, -0.45254833995939037], [-0.11313708498984754, -0.33941125496954283], [-0.22627416997969516, -0.22627416997969524], [-0.3394112549695428, -0.11313708498984767]]);
                      }
                    }
                  }
                }
              }
            }
          }
        }
      }
    }
  }
} // end module default_5_default_5
